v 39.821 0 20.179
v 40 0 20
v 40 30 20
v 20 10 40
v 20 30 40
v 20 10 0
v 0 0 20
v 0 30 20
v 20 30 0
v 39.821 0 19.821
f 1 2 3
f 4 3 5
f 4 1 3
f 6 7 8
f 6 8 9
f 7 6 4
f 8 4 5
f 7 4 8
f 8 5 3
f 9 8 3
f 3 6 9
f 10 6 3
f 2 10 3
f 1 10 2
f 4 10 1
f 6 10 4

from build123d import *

# Parameters (mm, degrees)
F2_DEPTH = 30
F6_DEPTH = 61


with BuildPart() as f2:
    # F1 (on Front) → F2 (new body)
    with BuildSketch(Plane.XZ):
        Polygon((20, 0), (20, 40), (0, 20), align=None)
        Polygon((40, 20), (20, 40), (20, 0), align=None)
    extrude(amount=-F2_DEPTH)

    # F5 (on face) → F6 (cut)
    with BuildSketch(Plane.XY):
        Polygon((20, 10), (0, 0), (39.821261, 0), align=None)
    extrude(amount=F6_DEPTH, mode=Mode.SUBTRACT)


solid = f2.part
